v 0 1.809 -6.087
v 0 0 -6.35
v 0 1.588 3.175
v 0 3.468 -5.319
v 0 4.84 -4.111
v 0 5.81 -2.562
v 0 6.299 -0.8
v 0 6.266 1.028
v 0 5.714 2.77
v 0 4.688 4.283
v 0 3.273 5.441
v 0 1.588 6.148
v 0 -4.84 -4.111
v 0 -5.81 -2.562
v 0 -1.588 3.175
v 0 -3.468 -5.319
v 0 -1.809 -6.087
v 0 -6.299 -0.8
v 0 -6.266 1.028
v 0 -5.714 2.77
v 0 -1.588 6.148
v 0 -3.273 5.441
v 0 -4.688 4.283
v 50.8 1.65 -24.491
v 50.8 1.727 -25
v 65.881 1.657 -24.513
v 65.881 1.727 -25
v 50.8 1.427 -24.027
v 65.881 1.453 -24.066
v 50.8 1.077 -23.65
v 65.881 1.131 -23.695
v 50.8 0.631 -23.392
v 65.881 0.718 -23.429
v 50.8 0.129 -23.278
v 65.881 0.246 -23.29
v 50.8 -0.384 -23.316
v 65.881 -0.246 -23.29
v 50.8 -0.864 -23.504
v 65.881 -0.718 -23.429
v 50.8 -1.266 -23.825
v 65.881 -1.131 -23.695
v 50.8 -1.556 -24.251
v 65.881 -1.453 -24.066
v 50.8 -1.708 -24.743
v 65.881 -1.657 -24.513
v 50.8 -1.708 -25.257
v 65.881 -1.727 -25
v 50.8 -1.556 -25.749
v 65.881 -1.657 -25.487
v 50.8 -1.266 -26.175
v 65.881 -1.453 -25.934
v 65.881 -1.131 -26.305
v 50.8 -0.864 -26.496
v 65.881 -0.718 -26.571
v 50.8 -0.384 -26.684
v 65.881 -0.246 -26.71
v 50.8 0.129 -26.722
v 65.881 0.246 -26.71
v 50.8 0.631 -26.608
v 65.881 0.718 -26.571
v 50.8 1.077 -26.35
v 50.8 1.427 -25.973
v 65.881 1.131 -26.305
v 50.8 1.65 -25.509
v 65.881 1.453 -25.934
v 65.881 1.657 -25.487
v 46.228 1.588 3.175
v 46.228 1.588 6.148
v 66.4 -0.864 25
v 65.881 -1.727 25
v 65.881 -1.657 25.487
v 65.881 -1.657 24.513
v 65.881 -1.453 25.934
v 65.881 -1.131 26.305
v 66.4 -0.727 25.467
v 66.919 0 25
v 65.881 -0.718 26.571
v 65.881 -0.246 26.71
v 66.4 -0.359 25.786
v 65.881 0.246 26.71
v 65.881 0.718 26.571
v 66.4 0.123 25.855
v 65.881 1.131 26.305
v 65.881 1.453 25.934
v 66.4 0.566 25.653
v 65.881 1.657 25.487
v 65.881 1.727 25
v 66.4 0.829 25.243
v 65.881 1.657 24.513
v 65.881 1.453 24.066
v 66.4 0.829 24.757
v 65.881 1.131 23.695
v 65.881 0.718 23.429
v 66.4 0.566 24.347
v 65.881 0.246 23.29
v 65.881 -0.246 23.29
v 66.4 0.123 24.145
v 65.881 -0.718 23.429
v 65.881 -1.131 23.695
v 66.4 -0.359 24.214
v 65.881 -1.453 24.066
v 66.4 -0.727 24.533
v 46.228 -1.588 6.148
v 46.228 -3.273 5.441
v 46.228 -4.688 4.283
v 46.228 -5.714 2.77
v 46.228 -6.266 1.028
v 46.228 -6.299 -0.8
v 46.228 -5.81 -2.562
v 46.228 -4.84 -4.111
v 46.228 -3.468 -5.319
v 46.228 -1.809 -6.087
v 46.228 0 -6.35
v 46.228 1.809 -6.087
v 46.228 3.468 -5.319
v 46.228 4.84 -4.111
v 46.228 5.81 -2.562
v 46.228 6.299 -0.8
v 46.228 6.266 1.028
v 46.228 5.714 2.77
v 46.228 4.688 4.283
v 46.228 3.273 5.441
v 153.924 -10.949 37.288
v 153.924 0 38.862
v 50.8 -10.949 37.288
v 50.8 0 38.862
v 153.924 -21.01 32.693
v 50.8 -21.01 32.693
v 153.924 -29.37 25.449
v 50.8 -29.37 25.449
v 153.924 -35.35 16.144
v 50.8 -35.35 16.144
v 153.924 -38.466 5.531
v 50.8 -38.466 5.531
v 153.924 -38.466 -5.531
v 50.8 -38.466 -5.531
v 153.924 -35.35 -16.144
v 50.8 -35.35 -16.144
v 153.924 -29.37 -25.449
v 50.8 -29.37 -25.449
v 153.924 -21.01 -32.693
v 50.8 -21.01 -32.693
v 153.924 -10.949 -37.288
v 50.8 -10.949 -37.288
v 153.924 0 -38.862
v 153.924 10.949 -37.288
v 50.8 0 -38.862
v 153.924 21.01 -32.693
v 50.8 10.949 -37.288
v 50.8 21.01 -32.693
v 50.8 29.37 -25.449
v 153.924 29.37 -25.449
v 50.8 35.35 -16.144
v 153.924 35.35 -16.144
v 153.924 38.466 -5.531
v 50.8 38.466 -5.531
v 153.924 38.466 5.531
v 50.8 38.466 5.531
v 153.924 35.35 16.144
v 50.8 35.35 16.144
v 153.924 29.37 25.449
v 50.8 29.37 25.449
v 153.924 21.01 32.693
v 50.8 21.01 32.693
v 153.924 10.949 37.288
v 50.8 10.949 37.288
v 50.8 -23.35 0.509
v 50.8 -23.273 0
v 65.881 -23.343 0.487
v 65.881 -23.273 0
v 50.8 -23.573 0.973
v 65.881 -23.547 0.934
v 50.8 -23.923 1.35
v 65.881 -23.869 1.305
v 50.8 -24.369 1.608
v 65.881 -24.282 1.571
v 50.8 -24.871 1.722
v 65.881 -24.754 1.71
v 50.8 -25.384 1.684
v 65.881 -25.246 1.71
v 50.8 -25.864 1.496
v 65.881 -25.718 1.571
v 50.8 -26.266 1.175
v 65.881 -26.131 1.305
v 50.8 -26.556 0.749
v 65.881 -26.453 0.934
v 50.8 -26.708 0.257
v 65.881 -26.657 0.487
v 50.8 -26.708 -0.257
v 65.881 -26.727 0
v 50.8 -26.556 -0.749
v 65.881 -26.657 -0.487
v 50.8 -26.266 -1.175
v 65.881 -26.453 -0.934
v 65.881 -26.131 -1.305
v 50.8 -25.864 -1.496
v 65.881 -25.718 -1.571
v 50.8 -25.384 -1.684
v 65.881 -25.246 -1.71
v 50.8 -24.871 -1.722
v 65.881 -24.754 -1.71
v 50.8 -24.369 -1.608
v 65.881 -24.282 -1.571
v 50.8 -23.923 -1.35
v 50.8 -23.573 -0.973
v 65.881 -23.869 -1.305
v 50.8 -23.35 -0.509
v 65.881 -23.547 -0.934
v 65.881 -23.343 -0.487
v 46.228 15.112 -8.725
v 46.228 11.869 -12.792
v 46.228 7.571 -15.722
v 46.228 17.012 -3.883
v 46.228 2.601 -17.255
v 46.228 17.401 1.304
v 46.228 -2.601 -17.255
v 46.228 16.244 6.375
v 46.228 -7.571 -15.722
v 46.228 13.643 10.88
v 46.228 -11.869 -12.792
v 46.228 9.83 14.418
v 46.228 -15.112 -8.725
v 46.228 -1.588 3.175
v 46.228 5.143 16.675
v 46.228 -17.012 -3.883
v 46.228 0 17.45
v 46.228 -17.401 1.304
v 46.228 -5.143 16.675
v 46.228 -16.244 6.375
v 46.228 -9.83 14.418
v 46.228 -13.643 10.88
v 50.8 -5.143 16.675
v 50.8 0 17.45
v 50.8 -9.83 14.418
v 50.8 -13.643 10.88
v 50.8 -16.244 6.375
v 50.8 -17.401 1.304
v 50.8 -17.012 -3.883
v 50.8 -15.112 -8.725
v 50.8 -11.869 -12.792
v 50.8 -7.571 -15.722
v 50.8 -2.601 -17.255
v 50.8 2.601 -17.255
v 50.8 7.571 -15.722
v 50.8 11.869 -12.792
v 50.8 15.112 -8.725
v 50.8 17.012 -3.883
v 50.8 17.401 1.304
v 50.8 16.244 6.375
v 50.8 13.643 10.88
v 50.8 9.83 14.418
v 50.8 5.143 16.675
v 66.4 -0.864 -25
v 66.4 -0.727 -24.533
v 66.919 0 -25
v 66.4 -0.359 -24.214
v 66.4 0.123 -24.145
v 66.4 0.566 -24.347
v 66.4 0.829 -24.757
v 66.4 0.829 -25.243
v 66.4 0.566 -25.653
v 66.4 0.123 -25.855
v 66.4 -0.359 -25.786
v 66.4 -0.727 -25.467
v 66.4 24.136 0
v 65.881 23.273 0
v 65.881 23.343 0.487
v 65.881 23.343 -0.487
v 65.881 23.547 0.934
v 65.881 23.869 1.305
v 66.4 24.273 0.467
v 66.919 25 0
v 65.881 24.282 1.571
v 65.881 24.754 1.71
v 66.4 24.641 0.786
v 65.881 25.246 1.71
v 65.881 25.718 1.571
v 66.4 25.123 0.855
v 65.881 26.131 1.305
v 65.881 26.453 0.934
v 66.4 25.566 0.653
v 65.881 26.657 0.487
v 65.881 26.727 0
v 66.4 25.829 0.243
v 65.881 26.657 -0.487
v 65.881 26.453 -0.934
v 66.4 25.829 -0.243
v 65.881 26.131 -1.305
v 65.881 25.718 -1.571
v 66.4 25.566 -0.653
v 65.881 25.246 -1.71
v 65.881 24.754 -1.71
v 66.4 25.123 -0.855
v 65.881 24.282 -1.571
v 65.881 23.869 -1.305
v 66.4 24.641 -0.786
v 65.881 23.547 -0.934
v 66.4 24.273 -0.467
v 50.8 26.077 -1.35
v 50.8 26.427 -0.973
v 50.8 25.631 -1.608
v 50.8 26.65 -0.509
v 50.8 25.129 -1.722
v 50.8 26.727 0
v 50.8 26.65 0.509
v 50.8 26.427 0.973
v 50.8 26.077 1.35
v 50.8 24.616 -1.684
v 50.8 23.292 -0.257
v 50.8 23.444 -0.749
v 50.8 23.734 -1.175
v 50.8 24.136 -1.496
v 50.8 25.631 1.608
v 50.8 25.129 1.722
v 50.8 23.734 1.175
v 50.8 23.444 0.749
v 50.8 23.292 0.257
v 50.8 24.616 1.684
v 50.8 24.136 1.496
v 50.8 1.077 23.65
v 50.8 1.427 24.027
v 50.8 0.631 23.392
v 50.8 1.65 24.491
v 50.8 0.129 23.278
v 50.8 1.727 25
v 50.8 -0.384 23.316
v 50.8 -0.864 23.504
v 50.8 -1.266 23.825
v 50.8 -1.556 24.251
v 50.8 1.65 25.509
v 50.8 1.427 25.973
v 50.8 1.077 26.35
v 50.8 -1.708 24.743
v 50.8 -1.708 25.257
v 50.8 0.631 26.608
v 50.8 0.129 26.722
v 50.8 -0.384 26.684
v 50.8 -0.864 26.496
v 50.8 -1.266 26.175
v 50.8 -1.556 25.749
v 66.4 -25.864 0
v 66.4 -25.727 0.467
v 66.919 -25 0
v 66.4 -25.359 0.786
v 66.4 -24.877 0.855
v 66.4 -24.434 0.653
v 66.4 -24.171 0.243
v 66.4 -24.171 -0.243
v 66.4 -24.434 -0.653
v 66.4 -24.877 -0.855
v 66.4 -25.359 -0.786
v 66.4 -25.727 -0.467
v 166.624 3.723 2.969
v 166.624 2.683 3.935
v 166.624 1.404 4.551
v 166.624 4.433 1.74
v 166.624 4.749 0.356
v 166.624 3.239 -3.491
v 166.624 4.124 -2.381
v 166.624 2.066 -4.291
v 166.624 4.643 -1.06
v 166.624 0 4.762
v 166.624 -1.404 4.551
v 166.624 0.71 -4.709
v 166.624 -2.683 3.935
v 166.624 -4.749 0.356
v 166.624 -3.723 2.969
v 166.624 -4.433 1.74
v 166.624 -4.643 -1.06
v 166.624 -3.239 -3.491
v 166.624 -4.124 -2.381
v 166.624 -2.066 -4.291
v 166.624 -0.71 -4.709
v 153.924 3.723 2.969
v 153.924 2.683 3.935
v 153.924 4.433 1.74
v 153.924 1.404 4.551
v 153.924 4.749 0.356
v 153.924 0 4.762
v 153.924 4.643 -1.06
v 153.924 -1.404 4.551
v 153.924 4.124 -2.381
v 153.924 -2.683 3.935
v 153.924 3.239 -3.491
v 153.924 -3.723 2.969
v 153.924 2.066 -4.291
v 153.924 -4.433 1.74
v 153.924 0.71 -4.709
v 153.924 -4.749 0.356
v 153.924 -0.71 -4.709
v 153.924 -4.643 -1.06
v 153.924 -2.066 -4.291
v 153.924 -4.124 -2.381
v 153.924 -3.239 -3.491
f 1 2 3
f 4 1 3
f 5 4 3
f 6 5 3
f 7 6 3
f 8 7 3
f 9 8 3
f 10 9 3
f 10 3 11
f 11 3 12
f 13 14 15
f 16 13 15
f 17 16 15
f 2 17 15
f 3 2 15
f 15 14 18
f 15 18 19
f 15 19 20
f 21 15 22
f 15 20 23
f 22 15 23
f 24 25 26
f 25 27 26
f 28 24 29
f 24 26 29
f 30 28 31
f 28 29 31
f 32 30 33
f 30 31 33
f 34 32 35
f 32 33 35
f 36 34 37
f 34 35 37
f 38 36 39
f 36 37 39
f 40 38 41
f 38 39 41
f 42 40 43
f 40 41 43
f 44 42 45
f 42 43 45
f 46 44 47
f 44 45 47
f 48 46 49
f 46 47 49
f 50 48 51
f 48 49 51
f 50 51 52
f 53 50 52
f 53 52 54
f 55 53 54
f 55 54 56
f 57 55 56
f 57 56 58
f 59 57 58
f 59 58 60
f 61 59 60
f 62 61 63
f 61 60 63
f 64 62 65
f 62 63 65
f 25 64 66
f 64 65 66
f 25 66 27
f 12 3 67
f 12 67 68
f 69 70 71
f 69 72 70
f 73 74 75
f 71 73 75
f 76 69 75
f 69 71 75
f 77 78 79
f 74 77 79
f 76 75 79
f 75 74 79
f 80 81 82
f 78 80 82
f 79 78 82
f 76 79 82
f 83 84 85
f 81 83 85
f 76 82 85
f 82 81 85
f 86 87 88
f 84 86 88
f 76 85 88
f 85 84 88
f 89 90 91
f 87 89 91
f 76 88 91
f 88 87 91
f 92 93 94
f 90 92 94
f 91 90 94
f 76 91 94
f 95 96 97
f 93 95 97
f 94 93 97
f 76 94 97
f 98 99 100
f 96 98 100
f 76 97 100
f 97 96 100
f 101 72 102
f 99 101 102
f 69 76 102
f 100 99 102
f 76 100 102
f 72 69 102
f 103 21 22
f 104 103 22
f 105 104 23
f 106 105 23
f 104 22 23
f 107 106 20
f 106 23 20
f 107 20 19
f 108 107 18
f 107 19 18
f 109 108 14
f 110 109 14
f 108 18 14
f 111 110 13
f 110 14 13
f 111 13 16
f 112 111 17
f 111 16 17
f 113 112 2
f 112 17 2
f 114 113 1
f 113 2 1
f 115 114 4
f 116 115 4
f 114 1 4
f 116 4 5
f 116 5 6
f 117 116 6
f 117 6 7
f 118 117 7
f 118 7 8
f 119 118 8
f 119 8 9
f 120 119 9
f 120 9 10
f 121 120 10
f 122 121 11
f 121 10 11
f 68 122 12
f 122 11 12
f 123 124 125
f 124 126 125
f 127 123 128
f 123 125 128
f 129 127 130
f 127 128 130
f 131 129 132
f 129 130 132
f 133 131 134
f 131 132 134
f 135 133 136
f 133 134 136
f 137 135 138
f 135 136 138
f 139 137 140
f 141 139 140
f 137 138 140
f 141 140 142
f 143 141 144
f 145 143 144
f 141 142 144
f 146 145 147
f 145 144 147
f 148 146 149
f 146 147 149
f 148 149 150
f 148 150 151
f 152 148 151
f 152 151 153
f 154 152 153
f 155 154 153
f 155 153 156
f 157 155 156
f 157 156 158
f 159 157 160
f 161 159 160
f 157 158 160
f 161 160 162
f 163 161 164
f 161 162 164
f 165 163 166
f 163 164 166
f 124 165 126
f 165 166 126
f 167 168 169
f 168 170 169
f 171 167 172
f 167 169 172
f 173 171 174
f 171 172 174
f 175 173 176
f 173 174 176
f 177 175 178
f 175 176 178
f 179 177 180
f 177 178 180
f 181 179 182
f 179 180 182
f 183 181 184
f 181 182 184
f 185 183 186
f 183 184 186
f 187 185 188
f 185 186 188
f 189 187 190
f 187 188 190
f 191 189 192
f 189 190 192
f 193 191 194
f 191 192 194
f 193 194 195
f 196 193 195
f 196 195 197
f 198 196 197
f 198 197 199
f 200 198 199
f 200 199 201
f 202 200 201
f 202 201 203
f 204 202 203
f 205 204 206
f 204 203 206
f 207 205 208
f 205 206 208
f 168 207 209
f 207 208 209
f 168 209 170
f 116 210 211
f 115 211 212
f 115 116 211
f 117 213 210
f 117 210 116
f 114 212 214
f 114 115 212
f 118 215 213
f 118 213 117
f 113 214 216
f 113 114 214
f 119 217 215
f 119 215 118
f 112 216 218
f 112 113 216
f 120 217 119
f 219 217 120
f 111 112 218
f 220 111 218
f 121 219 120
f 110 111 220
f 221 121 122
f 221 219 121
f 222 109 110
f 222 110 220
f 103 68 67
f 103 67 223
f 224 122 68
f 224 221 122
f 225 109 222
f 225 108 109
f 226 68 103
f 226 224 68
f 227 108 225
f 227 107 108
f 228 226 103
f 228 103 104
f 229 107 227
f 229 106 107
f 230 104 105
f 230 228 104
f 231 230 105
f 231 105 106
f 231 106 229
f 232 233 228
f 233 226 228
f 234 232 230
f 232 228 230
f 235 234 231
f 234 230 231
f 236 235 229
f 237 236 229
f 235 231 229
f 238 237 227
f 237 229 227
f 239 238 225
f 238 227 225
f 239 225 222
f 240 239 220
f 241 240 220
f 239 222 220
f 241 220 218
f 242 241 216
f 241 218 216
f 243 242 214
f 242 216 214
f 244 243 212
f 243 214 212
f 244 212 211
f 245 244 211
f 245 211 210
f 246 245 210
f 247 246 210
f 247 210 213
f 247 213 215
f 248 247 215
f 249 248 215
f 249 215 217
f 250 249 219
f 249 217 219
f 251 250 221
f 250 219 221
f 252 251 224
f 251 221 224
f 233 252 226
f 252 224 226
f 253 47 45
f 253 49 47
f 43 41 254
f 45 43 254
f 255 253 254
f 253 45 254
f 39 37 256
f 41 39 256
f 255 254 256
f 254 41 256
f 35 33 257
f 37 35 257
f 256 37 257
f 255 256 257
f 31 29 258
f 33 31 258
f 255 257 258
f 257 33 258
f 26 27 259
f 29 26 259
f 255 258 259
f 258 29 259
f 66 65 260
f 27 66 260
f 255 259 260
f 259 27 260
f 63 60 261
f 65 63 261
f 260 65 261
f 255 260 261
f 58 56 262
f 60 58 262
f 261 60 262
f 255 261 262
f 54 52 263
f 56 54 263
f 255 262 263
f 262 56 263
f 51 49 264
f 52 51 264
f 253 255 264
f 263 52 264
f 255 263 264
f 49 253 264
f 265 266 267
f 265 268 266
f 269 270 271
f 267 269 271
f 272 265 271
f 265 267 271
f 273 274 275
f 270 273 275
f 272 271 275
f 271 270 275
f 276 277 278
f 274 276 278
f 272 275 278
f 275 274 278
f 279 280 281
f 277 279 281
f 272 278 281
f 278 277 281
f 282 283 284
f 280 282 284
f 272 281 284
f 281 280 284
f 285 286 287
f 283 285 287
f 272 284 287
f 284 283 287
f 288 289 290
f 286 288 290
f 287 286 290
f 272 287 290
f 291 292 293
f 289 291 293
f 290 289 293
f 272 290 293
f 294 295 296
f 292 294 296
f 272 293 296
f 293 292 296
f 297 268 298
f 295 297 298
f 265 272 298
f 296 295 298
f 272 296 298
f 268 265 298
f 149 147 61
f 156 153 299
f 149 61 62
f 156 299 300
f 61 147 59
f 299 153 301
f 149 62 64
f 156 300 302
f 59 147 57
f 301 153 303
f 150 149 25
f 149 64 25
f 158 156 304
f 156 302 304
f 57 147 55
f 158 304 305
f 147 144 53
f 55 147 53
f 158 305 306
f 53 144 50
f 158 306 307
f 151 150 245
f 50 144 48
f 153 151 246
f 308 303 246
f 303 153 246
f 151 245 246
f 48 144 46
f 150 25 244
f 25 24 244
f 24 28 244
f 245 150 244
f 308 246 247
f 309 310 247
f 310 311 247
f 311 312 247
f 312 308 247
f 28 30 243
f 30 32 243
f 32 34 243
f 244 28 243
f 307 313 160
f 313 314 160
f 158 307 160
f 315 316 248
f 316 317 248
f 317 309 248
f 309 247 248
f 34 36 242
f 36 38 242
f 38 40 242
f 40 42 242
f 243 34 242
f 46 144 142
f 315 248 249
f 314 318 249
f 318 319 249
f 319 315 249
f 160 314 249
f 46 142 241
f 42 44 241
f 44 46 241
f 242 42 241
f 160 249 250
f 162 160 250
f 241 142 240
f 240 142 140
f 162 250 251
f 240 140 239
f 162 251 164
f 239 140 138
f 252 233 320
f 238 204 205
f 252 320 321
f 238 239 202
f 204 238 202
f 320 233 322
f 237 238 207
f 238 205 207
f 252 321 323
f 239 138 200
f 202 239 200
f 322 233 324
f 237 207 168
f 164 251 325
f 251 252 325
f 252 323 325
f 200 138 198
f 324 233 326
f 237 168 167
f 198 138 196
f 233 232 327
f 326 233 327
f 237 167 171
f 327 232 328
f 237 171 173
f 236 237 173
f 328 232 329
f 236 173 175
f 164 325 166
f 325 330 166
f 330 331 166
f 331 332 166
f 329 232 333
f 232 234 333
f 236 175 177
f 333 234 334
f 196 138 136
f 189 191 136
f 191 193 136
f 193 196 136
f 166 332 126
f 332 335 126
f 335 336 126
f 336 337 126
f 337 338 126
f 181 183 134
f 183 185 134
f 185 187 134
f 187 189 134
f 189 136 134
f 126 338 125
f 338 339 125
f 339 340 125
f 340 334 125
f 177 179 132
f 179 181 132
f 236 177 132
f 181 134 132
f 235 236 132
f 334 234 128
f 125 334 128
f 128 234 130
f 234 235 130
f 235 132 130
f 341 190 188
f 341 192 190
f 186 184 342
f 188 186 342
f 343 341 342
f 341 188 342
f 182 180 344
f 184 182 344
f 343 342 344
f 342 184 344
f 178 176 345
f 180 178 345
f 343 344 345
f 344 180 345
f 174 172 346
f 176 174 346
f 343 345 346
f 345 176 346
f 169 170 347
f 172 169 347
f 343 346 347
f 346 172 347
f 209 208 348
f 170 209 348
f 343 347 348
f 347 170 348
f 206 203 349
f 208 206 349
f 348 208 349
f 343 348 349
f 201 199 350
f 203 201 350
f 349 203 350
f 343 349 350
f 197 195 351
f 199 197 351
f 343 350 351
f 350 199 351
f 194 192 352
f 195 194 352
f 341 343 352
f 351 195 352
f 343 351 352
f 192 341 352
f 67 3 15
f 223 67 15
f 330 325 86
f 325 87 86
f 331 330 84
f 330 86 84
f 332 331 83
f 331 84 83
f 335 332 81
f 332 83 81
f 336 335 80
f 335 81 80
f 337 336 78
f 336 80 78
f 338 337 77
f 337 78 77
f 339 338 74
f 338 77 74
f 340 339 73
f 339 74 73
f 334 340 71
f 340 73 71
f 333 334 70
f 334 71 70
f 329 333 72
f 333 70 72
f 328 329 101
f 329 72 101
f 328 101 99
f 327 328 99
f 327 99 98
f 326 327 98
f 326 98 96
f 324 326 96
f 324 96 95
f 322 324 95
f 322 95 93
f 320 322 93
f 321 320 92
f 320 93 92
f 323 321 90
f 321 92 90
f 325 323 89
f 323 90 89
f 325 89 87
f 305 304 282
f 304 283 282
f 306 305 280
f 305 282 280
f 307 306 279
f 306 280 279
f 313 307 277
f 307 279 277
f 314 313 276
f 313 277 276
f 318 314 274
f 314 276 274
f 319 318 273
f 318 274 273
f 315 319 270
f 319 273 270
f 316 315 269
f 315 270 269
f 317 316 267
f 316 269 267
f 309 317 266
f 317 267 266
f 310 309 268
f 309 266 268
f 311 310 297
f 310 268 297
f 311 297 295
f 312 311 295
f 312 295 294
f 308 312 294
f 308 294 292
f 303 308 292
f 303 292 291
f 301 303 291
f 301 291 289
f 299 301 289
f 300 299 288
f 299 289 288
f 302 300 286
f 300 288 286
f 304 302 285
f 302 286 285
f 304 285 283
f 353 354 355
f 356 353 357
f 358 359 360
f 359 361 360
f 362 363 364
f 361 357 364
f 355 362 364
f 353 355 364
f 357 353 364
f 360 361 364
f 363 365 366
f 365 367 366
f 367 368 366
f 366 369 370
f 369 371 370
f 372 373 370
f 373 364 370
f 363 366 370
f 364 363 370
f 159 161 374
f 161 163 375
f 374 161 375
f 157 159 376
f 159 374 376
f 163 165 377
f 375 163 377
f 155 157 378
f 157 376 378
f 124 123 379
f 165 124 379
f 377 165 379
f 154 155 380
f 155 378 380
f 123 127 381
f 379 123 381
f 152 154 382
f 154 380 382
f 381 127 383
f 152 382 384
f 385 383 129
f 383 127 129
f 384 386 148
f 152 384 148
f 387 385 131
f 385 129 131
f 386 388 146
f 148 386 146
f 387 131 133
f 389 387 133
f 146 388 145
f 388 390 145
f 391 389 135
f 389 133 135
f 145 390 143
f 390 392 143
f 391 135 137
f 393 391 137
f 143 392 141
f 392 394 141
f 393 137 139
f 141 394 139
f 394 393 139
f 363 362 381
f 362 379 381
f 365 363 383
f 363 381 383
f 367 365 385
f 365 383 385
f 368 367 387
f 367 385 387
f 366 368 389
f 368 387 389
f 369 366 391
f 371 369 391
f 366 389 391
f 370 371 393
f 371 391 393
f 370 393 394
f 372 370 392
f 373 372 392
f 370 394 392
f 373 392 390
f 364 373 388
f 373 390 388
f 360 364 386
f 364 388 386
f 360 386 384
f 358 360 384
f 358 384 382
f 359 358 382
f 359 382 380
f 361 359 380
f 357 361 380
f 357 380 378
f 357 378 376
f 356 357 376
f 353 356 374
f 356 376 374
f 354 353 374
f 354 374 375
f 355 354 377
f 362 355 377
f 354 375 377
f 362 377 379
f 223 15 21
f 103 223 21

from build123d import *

# Parameters (mm, degrees)
F2_W     = 3.175
F2_H     = 8.4529162467
F3_DEPTH = 46.228
F5_D     = 3.4544
F5_DEPTH = 15.08125
F5_TIP   = 1.0378064612


with BuildPart() as f1:
    # F0 (on Front) → F1 (revolve)
    with BuildSketch(Plane.XZ):
        Polygon((0, 6.35), (0, 0), (166.624, 0), (166.624, 4.7625), (153.924, 4.7625), (153.924, 38.862), (50.8, 38.862), (50.8, 17.4498), (46.228, 17.4498), (46.228, 6.35), align=None)
    revolve(axis=Axis((76.633890767, 0, 0), (1, 0, 0)))

    # F2 (on face) → F3 (cut, through all)
    with BuildSketch(Plane(origin=(0, 0, 0), x_dir=(0, -1, 0), z_dir=(-1, 0, 0))):
        with Locations((0, 7.4014581233)):
            Rectangle(F2_W, F2_H)
    extrude(amount=-F3_DEPTH, mode=Mode.SUBTRACT)

    # F5
    with Locations(Plane(origin=(50.8, 0, 0), x_dir=(0, -1, 0), z_dir=(-1, 0, 0))):
        with Locations((-25, 0), (0, -25), (25, 0), (0, 25)):
            Hole(F5_D / 2, depth=F5_DEPTH)
            with Locations((0, 0, -(F5_DEPTH + F5_TIP / 2))):  # 118° drill point
                Cone(0, F5_D / 2, F5_TIP, mode=Mode.SUBTRACT)


solid = f1.part
